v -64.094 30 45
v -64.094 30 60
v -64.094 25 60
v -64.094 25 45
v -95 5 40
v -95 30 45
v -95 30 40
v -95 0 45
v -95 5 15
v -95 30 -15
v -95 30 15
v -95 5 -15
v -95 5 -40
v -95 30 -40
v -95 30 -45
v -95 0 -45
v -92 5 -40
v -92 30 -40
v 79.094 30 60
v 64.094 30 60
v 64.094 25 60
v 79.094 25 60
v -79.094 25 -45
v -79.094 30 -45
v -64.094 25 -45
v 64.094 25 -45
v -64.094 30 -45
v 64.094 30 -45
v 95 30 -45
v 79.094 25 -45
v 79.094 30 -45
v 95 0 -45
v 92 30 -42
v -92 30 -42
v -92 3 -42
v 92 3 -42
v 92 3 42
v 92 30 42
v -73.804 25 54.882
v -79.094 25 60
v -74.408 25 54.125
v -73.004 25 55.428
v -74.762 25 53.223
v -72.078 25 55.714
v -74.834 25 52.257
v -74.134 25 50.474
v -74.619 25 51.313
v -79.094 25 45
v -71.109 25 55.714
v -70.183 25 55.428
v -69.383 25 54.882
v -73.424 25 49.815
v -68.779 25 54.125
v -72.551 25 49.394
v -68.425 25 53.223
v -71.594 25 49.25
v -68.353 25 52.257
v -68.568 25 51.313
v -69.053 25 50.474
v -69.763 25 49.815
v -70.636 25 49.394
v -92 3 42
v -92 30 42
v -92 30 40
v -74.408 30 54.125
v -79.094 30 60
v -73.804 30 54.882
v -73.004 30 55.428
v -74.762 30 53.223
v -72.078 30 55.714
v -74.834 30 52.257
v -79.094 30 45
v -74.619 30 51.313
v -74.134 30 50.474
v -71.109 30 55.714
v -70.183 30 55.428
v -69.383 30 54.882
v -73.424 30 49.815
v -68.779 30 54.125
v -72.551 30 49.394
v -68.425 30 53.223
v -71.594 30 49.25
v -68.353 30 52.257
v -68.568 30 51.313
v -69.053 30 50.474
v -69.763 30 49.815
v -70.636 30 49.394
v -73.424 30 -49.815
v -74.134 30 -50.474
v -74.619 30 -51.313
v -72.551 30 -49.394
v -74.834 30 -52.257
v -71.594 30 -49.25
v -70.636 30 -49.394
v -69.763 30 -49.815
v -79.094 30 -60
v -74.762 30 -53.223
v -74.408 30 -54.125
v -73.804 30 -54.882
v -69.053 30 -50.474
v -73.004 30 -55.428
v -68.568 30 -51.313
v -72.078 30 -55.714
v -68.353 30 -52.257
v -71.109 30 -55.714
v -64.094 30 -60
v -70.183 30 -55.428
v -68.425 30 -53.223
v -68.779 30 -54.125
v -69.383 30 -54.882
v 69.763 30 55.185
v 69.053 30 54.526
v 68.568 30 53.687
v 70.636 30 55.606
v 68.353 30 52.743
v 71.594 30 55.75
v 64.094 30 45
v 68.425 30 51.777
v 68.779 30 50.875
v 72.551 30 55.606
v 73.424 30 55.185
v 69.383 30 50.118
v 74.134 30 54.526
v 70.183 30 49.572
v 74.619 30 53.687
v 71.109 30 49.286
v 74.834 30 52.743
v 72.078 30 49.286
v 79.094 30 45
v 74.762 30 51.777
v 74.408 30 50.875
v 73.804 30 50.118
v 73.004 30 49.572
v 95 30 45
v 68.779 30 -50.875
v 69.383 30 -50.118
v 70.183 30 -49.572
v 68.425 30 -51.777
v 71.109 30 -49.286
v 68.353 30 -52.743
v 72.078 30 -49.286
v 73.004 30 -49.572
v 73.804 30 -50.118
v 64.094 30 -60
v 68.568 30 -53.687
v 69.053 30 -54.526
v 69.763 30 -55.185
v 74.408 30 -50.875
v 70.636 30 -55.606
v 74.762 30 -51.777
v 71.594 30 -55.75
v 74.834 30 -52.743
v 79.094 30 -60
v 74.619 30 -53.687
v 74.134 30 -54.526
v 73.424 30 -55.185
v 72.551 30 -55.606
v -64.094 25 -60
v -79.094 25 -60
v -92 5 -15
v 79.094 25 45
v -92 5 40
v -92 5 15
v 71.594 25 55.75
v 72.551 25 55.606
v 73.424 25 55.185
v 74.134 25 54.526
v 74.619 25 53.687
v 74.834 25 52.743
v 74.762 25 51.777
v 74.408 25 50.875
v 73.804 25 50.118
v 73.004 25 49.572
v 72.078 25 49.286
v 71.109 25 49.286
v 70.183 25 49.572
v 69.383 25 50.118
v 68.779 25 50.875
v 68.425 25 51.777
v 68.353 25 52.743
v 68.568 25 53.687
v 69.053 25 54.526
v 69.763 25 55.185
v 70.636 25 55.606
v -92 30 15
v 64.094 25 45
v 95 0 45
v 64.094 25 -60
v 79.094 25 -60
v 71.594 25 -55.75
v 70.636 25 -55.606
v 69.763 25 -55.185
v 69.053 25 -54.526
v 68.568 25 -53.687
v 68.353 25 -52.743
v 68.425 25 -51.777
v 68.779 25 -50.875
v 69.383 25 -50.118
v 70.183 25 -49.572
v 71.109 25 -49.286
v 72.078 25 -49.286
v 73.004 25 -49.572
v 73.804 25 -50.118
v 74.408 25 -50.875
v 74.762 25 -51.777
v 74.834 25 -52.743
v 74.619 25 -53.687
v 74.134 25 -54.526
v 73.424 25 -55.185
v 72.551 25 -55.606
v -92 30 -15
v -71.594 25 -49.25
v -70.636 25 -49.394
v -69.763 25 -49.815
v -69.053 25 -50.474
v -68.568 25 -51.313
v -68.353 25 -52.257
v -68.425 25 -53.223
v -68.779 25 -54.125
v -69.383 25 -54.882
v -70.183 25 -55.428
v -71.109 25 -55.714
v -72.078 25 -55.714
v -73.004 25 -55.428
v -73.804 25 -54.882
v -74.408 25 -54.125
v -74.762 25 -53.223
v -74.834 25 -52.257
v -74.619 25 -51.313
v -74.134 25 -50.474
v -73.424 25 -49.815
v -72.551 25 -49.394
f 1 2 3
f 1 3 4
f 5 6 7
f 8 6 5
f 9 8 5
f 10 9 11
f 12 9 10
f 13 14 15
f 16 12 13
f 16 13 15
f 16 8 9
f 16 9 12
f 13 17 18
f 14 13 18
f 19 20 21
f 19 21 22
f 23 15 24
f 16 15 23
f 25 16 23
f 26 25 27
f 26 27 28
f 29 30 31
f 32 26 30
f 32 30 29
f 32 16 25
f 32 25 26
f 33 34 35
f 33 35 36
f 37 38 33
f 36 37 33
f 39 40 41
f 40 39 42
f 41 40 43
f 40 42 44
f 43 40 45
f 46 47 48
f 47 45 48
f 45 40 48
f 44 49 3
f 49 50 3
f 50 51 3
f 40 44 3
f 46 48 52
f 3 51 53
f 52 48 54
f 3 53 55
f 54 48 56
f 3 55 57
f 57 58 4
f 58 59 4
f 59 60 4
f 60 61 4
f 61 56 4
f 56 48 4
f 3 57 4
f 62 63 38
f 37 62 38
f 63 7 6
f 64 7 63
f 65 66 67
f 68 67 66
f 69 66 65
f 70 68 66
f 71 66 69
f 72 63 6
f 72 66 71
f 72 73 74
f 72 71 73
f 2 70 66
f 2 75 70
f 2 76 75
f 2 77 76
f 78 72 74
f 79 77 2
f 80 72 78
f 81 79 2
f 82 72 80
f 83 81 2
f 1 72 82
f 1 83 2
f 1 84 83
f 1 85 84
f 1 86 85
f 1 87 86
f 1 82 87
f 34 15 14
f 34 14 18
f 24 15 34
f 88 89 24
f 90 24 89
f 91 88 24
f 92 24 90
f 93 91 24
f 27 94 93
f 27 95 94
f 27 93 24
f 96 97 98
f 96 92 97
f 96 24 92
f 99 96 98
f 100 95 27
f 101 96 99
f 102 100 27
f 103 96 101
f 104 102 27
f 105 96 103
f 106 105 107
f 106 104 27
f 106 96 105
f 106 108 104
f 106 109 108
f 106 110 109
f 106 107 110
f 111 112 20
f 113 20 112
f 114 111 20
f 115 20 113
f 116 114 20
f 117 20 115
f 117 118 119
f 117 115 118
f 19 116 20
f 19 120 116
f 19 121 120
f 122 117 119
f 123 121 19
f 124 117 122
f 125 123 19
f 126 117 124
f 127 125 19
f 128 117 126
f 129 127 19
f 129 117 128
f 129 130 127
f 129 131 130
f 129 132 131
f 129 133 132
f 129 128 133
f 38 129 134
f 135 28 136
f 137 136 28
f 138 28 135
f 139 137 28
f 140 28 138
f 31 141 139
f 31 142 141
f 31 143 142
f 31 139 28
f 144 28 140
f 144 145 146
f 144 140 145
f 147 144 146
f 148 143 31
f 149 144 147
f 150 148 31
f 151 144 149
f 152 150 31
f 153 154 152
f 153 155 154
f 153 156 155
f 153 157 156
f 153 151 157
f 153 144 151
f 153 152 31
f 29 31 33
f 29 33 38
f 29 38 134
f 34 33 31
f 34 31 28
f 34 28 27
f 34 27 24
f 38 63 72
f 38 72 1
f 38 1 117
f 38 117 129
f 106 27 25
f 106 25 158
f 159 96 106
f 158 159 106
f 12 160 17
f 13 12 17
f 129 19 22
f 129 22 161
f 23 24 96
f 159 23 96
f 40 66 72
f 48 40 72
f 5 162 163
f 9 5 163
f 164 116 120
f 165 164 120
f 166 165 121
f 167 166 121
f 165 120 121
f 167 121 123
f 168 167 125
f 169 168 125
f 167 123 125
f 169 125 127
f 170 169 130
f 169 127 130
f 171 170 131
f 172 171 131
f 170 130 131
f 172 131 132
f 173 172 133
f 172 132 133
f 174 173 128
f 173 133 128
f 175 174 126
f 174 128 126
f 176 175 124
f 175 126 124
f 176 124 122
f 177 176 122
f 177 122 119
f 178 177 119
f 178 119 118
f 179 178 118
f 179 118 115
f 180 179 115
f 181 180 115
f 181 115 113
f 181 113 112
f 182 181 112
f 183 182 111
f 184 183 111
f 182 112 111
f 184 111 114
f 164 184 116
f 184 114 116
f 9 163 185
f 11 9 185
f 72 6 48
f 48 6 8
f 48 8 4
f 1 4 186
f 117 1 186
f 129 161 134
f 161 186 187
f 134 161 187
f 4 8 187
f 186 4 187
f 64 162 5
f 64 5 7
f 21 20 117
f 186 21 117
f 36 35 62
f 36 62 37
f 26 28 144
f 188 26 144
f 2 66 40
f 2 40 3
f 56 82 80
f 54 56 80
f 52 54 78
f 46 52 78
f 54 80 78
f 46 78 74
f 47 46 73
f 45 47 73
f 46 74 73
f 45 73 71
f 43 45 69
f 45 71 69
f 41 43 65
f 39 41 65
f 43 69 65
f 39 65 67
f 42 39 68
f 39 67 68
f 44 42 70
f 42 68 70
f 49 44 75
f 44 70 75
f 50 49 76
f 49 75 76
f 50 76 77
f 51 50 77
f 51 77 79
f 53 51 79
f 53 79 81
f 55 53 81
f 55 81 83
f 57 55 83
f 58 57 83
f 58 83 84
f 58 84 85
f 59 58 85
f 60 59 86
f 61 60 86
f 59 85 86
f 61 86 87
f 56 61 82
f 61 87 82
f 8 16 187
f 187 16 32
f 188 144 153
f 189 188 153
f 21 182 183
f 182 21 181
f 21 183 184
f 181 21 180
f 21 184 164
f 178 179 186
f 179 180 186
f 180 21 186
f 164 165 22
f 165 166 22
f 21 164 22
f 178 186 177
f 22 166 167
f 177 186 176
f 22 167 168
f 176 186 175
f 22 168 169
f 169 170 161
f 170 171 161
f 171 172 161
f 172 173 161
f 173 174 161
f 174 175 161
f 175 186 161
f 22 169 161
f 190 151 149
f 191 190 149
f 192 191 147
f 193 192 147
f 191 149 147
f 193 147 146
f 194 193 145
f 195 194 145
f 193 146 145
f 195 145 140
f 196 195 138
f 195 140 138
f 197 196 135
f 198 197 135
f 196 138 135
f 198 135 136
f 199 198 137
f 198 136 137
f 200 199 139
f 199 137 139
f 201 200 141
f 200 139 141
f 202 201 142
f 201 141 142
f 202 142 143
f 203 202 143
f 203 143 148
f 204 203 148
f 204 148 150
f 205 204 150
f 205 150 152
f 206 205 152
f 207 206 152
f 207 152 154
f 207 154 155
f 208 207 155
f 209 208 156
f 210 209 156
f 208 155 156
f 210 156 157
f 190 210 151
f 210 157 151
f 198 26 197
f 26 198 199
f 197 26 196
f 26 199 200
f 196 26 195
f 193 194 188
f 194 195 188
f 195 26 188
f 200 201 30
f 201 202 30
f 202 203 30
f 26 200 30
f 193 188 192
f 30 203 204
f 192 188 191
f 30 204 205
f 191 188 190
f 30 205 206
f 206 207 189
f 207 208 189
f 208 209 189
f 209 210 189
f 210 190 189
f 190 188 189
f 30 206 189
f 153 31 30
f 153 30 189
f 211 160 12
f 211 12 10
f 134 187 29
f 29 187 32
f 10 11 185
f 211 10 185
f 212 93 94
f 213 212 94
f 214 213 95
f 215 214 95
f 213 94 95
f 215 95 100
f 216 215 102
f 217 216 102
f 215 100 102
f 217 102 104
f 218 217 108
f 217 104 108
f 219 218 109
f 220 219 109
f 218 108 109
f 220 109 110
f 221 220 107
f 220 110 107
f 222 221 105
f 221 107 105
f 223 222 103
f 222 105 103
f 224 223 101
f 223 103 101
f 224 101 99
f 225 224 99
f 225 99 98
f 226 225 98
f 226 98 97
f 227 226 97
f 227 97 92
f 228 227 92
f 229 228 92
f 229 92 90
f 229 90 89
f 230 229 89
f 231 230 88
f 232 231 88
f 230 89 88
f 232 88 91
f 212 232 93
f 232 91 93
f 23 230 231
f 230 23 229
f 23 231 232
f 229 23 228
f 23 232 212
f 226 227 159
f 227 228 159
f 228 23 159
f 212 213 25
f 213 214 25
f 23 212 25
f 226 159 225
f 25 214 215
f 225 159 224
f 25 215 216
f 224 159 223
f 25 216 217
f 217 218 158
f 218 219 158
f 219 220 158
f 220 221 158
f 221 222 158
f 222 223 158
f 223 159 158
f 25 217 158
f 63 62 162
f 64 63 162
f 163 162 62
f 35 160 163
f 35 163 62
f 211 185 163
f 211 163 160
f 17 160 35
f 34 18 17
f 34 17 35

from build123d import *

# Parameters (mm, degrees)
SKETCH2_W           = 190
SKETCH2_H           = 90
BOSS_EXTRUDE1_DEPTH = 5
SKETCH3_W           = 190
SKETCH3_H           = 90
SKETCH3_W_2         = 180
SKETCH3_H_2         = 80
BOSS_EXTRUDE2_DEPTH = 25
SKETCH5_W           = 25
SKETCH5_H           = 25
CUT_EXTRUDE1_DEPTH  = 5
SKETCH6_W           = 15
SKETCH6_H           = 15
SKETCH6_R           = 3.25
BOSS_EXTRUDE3_DEPTH = 5
SKETCH8_W           = 184
SKETCH8_H           = 84
CUT_EXTRUDE2_DEPTH  = 27


with BuildPart() as part:
    # Sketch2 → Boss-Extrude1 (new body)
    with BuildSketch(Plane(origin=(0, 0, 0), x_dir=(1, 0, 0), z_dir=(0, 1, 0))):
        Rectangle(SKETCH2_W, SKETCH2_H)
    extrude(amount=BOSS_EXTRUDE1_DEPTH)

    # Sketch3 → Boss-Extrude2 (add)
    with BuildSketch(Plane(origin=(0, 5, 0), x_dir=(1, 0, 0), z_dir=(0, 1, 0))):
        Rectangle(SKETCH3_W, SKETCH3_H)
        Rectangle(SKETCH3_W_2, SKETCH3_H_2, mode=Mode.SUBTRACT)
    extrude(amount=BOSS_EXTRUDE2_DEPTH)

    # Sketch5 → Cut-Extrude1 (cut)
    with BuildSketch(Plane(origin=(-90, 0, 0), x_dir=(0, 0, -1), z_dir=(1, 0, 0))):
        with Locations((-27.5, 17.5)):
            Rectangle(SKETCH5_W, SKETCH5_H)
        with Locations((27.5, 17.5)):
            Rectangle(SKETCH5_W, SKETCH5_H)
    extrude(amount=-CUT_EXTRUDE1_DEPTH, mode=Mode.SUBTRACT)

    # Sketch6 → Boss-Extrude3 (add)
    # profile 1 of 4: a face of its own
    with BuildSketch(Plane(origin=(0, 30, 0), x_dir=(1, 0, 0), z_dir=(0, 1, 0))):
        with Locations((-71.593545043, 52.5)):
            Rectangle(SKETCH6_W, SKETCH6_H)
        with Locations(Location((-71.593545043, 52.5, 0), (0, 0, 270))):
            Circle(SKETCH6_R, mode=Mode.SUBTRACT)
    # profile 2 of 4: a face of its own
    with BuildSketch(Plane(origin=(0, 30, 0), x_dir=(1, 0, 0), z_dir=(0, 1, 0))):
        with Locations((-71.593545043, -52.5)):
            Rectangle(SKETCH6_W, SKETCH6_H)
        with Locations(Location((-71.593545043, -52.5, 0), (0, 0, 90))):
            Circle(SKETCH6_R, mode=Mode.SUBTRACT)
    # profile 3 of 4: a face of its own
    with BuildSketch(Plane(origin=(0, 30, 0), x_dir=(1, 0, 0), z_dir=(0, 1, 0))):
        with Locations((71.593545043, -52.5)):
            Rectangle(SKETCH6_W, SKETCH6_H)
        with Locations(Location((71.593545043, -52.5, 0), (0, 0, 270))):
            Circle(SKETCH6_R, mode=Mode.SUBTRACT)
    # profile 4 of 4: a face of its own
    with BuildSketch(Plane(origin=(0, 30, 0), x_dir=(1, 0, 0), z_dir=(0, 1, 0))):
        with Locations((71.593545043, 52.5)):
            Rectangle(SKETCH6_W, SKETCH6_H)
        with Locations(Location((71.593545043, 52.5, 0), (0, 0, 90))):
            Circle(SKETCH6_R, mode=Mode.SUBTRACT)
    extrude(amount=-BOSS_EXTRUDE3_DEPTH)

    # Sketch8 → Cut-Extrude2 (cut)
    with BuildSketch(Plane(origin=(0, 30, 0), x_dir=(1, 0, 0), z_dir=(0, 1, 0))):
        Rectangle(SKETCH8_W, SKETCH8_H)
    extrude(amount=-CUT_EXTRUDE2_DEPTH, mode=Mode.SUBTRACT)


solid = part.part
